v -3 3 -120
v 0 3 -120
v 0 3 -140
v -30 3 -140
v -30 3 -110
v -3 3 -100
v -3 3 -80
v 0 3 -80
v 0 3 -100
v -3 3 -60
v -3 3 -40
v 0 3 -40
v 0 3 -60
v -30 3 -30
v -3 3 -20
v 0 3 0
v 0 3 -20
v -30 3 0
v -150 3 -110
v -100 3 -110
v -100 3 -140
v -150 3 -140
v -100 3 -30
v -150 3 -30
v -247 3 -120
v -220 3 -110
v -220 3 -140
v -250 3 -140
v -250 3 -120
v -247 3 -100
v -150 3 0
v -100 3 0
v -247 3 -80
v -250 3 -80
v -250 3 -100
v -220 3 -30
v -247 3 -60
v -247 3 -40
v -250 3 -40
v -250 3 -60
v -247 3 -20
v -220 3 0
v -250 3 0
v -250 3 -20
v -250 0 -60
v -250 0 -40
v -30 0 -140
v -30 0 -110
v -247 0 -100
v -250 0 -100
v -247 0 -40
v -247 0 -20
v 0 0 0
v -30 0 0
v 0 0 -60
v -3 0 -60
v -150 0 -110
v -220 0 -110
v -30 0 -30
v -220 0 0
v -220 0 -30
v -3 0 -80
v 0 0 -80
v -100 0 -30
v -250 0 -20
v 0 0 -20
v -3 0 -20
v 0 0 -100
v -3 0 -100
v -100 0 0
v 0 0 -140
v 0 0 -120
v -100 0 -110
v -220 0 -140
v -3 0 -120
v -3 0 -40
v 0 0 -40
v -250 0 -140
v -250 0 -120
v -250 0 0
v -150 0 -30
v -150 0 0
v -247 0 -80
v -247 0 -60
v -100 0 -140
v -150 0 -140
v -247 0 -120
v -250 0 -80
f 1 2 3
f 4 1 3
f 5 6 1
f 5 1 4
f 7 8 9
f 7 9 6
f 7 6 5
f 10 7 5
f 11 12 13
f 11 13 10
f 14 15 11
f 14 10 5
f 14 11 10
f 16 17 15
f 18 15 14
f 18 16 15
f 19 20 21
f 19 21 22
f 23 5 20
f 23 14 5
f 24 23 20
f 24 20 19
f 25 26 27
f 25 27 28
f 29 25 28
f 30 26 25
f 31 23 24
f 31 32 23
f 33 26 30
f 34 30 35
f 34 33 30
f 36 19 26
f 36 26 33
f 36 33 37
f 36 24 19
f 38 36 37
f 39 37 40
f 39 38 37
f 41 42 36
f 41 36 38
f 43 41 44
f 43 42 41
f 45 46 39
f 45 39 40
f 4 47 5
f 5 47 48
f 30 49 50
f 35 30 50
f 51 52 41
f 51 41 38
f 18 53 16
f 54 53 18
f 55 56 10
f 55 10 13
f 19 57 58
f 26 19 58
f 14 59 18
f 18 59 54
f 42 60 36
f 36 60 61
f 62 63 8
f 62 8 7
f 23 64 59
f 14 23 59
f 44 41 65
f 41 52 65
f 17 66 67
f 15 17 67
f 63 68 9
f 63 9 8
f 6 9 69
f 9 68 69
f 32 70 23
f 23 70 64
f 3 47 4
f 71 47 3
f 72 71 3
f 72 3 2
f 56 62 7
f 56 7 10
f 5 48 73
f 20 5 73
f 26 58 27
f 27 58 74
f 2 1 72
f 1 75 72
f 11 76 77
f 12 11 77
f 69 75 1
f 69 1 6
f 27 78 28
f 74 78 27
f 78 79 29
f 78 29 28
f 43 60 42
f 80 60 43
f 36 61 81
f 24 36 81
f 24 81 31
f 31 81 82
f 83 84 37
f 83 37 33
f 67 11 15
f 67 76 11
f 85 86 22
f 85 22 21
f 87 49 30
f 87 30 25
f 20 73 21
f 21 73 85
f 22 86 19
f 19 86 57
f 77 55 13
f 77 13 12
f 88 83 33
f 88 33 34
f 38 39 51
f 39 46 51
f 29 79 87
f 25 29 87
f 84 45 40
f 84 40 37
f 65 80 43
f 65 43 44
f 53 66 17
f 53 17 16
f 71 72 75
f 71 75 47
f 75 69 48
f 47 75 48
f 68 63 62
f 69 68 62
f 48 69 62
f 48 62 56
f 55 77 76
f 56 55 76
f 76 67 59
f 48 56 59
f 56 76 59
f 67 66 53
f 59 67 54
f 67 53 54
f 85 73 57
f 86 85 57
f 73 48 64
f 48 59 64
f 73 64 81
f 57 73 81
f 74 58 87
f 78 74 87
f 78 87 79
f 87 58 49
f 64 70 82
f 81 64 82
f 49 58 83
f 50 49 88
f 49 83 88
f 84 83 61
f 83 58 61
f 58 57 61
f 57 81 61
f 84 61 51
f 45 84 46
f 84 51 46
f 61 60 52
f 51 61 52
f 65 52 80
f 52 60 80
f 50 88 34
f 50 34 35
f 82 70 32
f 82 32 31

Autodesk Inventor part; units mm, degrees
ref_plane "YZ Plane" through (0, 0, 0) normal (1, 0, 0) x (0, 1, 0)
ref_plane "XZ Plane" through (0, 0, 0) normal (0, 1, 0) x (-1, 0, 0)
ref_plane "XY Plane" through (0, 0, 0) normal (0, 0, 1) x (1, 0, 0)
sketch "Sketch1" plane through (0, 0, 0) normal (0, 1, 0) x (-1, 0, 0)
  line L0 (0, 0) -> (250, 0)
  line L1 (0, -140) -> (0, 0)
  line L2 (250, 0) -> (250, -70)
  line L3 (250, 0) -> (125, 0)
  line L4 (125, 0) -> (125, -70)
  line L5 (125, -70) -> (250, -70)
  line L6 (250, -70) -> (250, 0)
  line L7 (250, 0) -> (220, 0)
  line L8 (220, 0) -> (220, -30)
  line L9 (220, -30) -> (150, -30)
  line L10 (150, -30) -> (150, 0)
  line L11 (250, 0) -> (247, 0)
  line L12 (247, 0) -> (247, -20)
  line L13 (247, -20) -> (250, -20)
  line L14 (247, -20) -> (247, -70)
  line L15 (250, -20) -> (250, -40)
  line L16 (250, -40) -> (250, -60)
  line L17 (250, -60) -> (247, -60)
  line L18 (250, -40) -> (247, -40)
  dimension "d2" = 125
  dimension "d3" = 70
  dimension "d5" = 30
  dimension "d6" = 70
  dimension "d7" = 3
  dimension "d8" = 20
  dimension "d9" = 20
  dimension "d10" = 20
extrude "Extrusion1" add sketch "Sketch1" along normal blind 3 contours L0 L10 L9 L8 L12 L14 L5 L4 | L0 L2 L13 L12 | L14 L18 L2 L17
mirror "Mirror1" about plane through (-125, 0, -70) normal (0, 0, -1) of "Extrusion1"
mirror "Mirror2" about plane through (-125, 0, 0) normal (1, 0, 0) of "Extrusion1", "Mirror1"
properties part number "onderkant"
